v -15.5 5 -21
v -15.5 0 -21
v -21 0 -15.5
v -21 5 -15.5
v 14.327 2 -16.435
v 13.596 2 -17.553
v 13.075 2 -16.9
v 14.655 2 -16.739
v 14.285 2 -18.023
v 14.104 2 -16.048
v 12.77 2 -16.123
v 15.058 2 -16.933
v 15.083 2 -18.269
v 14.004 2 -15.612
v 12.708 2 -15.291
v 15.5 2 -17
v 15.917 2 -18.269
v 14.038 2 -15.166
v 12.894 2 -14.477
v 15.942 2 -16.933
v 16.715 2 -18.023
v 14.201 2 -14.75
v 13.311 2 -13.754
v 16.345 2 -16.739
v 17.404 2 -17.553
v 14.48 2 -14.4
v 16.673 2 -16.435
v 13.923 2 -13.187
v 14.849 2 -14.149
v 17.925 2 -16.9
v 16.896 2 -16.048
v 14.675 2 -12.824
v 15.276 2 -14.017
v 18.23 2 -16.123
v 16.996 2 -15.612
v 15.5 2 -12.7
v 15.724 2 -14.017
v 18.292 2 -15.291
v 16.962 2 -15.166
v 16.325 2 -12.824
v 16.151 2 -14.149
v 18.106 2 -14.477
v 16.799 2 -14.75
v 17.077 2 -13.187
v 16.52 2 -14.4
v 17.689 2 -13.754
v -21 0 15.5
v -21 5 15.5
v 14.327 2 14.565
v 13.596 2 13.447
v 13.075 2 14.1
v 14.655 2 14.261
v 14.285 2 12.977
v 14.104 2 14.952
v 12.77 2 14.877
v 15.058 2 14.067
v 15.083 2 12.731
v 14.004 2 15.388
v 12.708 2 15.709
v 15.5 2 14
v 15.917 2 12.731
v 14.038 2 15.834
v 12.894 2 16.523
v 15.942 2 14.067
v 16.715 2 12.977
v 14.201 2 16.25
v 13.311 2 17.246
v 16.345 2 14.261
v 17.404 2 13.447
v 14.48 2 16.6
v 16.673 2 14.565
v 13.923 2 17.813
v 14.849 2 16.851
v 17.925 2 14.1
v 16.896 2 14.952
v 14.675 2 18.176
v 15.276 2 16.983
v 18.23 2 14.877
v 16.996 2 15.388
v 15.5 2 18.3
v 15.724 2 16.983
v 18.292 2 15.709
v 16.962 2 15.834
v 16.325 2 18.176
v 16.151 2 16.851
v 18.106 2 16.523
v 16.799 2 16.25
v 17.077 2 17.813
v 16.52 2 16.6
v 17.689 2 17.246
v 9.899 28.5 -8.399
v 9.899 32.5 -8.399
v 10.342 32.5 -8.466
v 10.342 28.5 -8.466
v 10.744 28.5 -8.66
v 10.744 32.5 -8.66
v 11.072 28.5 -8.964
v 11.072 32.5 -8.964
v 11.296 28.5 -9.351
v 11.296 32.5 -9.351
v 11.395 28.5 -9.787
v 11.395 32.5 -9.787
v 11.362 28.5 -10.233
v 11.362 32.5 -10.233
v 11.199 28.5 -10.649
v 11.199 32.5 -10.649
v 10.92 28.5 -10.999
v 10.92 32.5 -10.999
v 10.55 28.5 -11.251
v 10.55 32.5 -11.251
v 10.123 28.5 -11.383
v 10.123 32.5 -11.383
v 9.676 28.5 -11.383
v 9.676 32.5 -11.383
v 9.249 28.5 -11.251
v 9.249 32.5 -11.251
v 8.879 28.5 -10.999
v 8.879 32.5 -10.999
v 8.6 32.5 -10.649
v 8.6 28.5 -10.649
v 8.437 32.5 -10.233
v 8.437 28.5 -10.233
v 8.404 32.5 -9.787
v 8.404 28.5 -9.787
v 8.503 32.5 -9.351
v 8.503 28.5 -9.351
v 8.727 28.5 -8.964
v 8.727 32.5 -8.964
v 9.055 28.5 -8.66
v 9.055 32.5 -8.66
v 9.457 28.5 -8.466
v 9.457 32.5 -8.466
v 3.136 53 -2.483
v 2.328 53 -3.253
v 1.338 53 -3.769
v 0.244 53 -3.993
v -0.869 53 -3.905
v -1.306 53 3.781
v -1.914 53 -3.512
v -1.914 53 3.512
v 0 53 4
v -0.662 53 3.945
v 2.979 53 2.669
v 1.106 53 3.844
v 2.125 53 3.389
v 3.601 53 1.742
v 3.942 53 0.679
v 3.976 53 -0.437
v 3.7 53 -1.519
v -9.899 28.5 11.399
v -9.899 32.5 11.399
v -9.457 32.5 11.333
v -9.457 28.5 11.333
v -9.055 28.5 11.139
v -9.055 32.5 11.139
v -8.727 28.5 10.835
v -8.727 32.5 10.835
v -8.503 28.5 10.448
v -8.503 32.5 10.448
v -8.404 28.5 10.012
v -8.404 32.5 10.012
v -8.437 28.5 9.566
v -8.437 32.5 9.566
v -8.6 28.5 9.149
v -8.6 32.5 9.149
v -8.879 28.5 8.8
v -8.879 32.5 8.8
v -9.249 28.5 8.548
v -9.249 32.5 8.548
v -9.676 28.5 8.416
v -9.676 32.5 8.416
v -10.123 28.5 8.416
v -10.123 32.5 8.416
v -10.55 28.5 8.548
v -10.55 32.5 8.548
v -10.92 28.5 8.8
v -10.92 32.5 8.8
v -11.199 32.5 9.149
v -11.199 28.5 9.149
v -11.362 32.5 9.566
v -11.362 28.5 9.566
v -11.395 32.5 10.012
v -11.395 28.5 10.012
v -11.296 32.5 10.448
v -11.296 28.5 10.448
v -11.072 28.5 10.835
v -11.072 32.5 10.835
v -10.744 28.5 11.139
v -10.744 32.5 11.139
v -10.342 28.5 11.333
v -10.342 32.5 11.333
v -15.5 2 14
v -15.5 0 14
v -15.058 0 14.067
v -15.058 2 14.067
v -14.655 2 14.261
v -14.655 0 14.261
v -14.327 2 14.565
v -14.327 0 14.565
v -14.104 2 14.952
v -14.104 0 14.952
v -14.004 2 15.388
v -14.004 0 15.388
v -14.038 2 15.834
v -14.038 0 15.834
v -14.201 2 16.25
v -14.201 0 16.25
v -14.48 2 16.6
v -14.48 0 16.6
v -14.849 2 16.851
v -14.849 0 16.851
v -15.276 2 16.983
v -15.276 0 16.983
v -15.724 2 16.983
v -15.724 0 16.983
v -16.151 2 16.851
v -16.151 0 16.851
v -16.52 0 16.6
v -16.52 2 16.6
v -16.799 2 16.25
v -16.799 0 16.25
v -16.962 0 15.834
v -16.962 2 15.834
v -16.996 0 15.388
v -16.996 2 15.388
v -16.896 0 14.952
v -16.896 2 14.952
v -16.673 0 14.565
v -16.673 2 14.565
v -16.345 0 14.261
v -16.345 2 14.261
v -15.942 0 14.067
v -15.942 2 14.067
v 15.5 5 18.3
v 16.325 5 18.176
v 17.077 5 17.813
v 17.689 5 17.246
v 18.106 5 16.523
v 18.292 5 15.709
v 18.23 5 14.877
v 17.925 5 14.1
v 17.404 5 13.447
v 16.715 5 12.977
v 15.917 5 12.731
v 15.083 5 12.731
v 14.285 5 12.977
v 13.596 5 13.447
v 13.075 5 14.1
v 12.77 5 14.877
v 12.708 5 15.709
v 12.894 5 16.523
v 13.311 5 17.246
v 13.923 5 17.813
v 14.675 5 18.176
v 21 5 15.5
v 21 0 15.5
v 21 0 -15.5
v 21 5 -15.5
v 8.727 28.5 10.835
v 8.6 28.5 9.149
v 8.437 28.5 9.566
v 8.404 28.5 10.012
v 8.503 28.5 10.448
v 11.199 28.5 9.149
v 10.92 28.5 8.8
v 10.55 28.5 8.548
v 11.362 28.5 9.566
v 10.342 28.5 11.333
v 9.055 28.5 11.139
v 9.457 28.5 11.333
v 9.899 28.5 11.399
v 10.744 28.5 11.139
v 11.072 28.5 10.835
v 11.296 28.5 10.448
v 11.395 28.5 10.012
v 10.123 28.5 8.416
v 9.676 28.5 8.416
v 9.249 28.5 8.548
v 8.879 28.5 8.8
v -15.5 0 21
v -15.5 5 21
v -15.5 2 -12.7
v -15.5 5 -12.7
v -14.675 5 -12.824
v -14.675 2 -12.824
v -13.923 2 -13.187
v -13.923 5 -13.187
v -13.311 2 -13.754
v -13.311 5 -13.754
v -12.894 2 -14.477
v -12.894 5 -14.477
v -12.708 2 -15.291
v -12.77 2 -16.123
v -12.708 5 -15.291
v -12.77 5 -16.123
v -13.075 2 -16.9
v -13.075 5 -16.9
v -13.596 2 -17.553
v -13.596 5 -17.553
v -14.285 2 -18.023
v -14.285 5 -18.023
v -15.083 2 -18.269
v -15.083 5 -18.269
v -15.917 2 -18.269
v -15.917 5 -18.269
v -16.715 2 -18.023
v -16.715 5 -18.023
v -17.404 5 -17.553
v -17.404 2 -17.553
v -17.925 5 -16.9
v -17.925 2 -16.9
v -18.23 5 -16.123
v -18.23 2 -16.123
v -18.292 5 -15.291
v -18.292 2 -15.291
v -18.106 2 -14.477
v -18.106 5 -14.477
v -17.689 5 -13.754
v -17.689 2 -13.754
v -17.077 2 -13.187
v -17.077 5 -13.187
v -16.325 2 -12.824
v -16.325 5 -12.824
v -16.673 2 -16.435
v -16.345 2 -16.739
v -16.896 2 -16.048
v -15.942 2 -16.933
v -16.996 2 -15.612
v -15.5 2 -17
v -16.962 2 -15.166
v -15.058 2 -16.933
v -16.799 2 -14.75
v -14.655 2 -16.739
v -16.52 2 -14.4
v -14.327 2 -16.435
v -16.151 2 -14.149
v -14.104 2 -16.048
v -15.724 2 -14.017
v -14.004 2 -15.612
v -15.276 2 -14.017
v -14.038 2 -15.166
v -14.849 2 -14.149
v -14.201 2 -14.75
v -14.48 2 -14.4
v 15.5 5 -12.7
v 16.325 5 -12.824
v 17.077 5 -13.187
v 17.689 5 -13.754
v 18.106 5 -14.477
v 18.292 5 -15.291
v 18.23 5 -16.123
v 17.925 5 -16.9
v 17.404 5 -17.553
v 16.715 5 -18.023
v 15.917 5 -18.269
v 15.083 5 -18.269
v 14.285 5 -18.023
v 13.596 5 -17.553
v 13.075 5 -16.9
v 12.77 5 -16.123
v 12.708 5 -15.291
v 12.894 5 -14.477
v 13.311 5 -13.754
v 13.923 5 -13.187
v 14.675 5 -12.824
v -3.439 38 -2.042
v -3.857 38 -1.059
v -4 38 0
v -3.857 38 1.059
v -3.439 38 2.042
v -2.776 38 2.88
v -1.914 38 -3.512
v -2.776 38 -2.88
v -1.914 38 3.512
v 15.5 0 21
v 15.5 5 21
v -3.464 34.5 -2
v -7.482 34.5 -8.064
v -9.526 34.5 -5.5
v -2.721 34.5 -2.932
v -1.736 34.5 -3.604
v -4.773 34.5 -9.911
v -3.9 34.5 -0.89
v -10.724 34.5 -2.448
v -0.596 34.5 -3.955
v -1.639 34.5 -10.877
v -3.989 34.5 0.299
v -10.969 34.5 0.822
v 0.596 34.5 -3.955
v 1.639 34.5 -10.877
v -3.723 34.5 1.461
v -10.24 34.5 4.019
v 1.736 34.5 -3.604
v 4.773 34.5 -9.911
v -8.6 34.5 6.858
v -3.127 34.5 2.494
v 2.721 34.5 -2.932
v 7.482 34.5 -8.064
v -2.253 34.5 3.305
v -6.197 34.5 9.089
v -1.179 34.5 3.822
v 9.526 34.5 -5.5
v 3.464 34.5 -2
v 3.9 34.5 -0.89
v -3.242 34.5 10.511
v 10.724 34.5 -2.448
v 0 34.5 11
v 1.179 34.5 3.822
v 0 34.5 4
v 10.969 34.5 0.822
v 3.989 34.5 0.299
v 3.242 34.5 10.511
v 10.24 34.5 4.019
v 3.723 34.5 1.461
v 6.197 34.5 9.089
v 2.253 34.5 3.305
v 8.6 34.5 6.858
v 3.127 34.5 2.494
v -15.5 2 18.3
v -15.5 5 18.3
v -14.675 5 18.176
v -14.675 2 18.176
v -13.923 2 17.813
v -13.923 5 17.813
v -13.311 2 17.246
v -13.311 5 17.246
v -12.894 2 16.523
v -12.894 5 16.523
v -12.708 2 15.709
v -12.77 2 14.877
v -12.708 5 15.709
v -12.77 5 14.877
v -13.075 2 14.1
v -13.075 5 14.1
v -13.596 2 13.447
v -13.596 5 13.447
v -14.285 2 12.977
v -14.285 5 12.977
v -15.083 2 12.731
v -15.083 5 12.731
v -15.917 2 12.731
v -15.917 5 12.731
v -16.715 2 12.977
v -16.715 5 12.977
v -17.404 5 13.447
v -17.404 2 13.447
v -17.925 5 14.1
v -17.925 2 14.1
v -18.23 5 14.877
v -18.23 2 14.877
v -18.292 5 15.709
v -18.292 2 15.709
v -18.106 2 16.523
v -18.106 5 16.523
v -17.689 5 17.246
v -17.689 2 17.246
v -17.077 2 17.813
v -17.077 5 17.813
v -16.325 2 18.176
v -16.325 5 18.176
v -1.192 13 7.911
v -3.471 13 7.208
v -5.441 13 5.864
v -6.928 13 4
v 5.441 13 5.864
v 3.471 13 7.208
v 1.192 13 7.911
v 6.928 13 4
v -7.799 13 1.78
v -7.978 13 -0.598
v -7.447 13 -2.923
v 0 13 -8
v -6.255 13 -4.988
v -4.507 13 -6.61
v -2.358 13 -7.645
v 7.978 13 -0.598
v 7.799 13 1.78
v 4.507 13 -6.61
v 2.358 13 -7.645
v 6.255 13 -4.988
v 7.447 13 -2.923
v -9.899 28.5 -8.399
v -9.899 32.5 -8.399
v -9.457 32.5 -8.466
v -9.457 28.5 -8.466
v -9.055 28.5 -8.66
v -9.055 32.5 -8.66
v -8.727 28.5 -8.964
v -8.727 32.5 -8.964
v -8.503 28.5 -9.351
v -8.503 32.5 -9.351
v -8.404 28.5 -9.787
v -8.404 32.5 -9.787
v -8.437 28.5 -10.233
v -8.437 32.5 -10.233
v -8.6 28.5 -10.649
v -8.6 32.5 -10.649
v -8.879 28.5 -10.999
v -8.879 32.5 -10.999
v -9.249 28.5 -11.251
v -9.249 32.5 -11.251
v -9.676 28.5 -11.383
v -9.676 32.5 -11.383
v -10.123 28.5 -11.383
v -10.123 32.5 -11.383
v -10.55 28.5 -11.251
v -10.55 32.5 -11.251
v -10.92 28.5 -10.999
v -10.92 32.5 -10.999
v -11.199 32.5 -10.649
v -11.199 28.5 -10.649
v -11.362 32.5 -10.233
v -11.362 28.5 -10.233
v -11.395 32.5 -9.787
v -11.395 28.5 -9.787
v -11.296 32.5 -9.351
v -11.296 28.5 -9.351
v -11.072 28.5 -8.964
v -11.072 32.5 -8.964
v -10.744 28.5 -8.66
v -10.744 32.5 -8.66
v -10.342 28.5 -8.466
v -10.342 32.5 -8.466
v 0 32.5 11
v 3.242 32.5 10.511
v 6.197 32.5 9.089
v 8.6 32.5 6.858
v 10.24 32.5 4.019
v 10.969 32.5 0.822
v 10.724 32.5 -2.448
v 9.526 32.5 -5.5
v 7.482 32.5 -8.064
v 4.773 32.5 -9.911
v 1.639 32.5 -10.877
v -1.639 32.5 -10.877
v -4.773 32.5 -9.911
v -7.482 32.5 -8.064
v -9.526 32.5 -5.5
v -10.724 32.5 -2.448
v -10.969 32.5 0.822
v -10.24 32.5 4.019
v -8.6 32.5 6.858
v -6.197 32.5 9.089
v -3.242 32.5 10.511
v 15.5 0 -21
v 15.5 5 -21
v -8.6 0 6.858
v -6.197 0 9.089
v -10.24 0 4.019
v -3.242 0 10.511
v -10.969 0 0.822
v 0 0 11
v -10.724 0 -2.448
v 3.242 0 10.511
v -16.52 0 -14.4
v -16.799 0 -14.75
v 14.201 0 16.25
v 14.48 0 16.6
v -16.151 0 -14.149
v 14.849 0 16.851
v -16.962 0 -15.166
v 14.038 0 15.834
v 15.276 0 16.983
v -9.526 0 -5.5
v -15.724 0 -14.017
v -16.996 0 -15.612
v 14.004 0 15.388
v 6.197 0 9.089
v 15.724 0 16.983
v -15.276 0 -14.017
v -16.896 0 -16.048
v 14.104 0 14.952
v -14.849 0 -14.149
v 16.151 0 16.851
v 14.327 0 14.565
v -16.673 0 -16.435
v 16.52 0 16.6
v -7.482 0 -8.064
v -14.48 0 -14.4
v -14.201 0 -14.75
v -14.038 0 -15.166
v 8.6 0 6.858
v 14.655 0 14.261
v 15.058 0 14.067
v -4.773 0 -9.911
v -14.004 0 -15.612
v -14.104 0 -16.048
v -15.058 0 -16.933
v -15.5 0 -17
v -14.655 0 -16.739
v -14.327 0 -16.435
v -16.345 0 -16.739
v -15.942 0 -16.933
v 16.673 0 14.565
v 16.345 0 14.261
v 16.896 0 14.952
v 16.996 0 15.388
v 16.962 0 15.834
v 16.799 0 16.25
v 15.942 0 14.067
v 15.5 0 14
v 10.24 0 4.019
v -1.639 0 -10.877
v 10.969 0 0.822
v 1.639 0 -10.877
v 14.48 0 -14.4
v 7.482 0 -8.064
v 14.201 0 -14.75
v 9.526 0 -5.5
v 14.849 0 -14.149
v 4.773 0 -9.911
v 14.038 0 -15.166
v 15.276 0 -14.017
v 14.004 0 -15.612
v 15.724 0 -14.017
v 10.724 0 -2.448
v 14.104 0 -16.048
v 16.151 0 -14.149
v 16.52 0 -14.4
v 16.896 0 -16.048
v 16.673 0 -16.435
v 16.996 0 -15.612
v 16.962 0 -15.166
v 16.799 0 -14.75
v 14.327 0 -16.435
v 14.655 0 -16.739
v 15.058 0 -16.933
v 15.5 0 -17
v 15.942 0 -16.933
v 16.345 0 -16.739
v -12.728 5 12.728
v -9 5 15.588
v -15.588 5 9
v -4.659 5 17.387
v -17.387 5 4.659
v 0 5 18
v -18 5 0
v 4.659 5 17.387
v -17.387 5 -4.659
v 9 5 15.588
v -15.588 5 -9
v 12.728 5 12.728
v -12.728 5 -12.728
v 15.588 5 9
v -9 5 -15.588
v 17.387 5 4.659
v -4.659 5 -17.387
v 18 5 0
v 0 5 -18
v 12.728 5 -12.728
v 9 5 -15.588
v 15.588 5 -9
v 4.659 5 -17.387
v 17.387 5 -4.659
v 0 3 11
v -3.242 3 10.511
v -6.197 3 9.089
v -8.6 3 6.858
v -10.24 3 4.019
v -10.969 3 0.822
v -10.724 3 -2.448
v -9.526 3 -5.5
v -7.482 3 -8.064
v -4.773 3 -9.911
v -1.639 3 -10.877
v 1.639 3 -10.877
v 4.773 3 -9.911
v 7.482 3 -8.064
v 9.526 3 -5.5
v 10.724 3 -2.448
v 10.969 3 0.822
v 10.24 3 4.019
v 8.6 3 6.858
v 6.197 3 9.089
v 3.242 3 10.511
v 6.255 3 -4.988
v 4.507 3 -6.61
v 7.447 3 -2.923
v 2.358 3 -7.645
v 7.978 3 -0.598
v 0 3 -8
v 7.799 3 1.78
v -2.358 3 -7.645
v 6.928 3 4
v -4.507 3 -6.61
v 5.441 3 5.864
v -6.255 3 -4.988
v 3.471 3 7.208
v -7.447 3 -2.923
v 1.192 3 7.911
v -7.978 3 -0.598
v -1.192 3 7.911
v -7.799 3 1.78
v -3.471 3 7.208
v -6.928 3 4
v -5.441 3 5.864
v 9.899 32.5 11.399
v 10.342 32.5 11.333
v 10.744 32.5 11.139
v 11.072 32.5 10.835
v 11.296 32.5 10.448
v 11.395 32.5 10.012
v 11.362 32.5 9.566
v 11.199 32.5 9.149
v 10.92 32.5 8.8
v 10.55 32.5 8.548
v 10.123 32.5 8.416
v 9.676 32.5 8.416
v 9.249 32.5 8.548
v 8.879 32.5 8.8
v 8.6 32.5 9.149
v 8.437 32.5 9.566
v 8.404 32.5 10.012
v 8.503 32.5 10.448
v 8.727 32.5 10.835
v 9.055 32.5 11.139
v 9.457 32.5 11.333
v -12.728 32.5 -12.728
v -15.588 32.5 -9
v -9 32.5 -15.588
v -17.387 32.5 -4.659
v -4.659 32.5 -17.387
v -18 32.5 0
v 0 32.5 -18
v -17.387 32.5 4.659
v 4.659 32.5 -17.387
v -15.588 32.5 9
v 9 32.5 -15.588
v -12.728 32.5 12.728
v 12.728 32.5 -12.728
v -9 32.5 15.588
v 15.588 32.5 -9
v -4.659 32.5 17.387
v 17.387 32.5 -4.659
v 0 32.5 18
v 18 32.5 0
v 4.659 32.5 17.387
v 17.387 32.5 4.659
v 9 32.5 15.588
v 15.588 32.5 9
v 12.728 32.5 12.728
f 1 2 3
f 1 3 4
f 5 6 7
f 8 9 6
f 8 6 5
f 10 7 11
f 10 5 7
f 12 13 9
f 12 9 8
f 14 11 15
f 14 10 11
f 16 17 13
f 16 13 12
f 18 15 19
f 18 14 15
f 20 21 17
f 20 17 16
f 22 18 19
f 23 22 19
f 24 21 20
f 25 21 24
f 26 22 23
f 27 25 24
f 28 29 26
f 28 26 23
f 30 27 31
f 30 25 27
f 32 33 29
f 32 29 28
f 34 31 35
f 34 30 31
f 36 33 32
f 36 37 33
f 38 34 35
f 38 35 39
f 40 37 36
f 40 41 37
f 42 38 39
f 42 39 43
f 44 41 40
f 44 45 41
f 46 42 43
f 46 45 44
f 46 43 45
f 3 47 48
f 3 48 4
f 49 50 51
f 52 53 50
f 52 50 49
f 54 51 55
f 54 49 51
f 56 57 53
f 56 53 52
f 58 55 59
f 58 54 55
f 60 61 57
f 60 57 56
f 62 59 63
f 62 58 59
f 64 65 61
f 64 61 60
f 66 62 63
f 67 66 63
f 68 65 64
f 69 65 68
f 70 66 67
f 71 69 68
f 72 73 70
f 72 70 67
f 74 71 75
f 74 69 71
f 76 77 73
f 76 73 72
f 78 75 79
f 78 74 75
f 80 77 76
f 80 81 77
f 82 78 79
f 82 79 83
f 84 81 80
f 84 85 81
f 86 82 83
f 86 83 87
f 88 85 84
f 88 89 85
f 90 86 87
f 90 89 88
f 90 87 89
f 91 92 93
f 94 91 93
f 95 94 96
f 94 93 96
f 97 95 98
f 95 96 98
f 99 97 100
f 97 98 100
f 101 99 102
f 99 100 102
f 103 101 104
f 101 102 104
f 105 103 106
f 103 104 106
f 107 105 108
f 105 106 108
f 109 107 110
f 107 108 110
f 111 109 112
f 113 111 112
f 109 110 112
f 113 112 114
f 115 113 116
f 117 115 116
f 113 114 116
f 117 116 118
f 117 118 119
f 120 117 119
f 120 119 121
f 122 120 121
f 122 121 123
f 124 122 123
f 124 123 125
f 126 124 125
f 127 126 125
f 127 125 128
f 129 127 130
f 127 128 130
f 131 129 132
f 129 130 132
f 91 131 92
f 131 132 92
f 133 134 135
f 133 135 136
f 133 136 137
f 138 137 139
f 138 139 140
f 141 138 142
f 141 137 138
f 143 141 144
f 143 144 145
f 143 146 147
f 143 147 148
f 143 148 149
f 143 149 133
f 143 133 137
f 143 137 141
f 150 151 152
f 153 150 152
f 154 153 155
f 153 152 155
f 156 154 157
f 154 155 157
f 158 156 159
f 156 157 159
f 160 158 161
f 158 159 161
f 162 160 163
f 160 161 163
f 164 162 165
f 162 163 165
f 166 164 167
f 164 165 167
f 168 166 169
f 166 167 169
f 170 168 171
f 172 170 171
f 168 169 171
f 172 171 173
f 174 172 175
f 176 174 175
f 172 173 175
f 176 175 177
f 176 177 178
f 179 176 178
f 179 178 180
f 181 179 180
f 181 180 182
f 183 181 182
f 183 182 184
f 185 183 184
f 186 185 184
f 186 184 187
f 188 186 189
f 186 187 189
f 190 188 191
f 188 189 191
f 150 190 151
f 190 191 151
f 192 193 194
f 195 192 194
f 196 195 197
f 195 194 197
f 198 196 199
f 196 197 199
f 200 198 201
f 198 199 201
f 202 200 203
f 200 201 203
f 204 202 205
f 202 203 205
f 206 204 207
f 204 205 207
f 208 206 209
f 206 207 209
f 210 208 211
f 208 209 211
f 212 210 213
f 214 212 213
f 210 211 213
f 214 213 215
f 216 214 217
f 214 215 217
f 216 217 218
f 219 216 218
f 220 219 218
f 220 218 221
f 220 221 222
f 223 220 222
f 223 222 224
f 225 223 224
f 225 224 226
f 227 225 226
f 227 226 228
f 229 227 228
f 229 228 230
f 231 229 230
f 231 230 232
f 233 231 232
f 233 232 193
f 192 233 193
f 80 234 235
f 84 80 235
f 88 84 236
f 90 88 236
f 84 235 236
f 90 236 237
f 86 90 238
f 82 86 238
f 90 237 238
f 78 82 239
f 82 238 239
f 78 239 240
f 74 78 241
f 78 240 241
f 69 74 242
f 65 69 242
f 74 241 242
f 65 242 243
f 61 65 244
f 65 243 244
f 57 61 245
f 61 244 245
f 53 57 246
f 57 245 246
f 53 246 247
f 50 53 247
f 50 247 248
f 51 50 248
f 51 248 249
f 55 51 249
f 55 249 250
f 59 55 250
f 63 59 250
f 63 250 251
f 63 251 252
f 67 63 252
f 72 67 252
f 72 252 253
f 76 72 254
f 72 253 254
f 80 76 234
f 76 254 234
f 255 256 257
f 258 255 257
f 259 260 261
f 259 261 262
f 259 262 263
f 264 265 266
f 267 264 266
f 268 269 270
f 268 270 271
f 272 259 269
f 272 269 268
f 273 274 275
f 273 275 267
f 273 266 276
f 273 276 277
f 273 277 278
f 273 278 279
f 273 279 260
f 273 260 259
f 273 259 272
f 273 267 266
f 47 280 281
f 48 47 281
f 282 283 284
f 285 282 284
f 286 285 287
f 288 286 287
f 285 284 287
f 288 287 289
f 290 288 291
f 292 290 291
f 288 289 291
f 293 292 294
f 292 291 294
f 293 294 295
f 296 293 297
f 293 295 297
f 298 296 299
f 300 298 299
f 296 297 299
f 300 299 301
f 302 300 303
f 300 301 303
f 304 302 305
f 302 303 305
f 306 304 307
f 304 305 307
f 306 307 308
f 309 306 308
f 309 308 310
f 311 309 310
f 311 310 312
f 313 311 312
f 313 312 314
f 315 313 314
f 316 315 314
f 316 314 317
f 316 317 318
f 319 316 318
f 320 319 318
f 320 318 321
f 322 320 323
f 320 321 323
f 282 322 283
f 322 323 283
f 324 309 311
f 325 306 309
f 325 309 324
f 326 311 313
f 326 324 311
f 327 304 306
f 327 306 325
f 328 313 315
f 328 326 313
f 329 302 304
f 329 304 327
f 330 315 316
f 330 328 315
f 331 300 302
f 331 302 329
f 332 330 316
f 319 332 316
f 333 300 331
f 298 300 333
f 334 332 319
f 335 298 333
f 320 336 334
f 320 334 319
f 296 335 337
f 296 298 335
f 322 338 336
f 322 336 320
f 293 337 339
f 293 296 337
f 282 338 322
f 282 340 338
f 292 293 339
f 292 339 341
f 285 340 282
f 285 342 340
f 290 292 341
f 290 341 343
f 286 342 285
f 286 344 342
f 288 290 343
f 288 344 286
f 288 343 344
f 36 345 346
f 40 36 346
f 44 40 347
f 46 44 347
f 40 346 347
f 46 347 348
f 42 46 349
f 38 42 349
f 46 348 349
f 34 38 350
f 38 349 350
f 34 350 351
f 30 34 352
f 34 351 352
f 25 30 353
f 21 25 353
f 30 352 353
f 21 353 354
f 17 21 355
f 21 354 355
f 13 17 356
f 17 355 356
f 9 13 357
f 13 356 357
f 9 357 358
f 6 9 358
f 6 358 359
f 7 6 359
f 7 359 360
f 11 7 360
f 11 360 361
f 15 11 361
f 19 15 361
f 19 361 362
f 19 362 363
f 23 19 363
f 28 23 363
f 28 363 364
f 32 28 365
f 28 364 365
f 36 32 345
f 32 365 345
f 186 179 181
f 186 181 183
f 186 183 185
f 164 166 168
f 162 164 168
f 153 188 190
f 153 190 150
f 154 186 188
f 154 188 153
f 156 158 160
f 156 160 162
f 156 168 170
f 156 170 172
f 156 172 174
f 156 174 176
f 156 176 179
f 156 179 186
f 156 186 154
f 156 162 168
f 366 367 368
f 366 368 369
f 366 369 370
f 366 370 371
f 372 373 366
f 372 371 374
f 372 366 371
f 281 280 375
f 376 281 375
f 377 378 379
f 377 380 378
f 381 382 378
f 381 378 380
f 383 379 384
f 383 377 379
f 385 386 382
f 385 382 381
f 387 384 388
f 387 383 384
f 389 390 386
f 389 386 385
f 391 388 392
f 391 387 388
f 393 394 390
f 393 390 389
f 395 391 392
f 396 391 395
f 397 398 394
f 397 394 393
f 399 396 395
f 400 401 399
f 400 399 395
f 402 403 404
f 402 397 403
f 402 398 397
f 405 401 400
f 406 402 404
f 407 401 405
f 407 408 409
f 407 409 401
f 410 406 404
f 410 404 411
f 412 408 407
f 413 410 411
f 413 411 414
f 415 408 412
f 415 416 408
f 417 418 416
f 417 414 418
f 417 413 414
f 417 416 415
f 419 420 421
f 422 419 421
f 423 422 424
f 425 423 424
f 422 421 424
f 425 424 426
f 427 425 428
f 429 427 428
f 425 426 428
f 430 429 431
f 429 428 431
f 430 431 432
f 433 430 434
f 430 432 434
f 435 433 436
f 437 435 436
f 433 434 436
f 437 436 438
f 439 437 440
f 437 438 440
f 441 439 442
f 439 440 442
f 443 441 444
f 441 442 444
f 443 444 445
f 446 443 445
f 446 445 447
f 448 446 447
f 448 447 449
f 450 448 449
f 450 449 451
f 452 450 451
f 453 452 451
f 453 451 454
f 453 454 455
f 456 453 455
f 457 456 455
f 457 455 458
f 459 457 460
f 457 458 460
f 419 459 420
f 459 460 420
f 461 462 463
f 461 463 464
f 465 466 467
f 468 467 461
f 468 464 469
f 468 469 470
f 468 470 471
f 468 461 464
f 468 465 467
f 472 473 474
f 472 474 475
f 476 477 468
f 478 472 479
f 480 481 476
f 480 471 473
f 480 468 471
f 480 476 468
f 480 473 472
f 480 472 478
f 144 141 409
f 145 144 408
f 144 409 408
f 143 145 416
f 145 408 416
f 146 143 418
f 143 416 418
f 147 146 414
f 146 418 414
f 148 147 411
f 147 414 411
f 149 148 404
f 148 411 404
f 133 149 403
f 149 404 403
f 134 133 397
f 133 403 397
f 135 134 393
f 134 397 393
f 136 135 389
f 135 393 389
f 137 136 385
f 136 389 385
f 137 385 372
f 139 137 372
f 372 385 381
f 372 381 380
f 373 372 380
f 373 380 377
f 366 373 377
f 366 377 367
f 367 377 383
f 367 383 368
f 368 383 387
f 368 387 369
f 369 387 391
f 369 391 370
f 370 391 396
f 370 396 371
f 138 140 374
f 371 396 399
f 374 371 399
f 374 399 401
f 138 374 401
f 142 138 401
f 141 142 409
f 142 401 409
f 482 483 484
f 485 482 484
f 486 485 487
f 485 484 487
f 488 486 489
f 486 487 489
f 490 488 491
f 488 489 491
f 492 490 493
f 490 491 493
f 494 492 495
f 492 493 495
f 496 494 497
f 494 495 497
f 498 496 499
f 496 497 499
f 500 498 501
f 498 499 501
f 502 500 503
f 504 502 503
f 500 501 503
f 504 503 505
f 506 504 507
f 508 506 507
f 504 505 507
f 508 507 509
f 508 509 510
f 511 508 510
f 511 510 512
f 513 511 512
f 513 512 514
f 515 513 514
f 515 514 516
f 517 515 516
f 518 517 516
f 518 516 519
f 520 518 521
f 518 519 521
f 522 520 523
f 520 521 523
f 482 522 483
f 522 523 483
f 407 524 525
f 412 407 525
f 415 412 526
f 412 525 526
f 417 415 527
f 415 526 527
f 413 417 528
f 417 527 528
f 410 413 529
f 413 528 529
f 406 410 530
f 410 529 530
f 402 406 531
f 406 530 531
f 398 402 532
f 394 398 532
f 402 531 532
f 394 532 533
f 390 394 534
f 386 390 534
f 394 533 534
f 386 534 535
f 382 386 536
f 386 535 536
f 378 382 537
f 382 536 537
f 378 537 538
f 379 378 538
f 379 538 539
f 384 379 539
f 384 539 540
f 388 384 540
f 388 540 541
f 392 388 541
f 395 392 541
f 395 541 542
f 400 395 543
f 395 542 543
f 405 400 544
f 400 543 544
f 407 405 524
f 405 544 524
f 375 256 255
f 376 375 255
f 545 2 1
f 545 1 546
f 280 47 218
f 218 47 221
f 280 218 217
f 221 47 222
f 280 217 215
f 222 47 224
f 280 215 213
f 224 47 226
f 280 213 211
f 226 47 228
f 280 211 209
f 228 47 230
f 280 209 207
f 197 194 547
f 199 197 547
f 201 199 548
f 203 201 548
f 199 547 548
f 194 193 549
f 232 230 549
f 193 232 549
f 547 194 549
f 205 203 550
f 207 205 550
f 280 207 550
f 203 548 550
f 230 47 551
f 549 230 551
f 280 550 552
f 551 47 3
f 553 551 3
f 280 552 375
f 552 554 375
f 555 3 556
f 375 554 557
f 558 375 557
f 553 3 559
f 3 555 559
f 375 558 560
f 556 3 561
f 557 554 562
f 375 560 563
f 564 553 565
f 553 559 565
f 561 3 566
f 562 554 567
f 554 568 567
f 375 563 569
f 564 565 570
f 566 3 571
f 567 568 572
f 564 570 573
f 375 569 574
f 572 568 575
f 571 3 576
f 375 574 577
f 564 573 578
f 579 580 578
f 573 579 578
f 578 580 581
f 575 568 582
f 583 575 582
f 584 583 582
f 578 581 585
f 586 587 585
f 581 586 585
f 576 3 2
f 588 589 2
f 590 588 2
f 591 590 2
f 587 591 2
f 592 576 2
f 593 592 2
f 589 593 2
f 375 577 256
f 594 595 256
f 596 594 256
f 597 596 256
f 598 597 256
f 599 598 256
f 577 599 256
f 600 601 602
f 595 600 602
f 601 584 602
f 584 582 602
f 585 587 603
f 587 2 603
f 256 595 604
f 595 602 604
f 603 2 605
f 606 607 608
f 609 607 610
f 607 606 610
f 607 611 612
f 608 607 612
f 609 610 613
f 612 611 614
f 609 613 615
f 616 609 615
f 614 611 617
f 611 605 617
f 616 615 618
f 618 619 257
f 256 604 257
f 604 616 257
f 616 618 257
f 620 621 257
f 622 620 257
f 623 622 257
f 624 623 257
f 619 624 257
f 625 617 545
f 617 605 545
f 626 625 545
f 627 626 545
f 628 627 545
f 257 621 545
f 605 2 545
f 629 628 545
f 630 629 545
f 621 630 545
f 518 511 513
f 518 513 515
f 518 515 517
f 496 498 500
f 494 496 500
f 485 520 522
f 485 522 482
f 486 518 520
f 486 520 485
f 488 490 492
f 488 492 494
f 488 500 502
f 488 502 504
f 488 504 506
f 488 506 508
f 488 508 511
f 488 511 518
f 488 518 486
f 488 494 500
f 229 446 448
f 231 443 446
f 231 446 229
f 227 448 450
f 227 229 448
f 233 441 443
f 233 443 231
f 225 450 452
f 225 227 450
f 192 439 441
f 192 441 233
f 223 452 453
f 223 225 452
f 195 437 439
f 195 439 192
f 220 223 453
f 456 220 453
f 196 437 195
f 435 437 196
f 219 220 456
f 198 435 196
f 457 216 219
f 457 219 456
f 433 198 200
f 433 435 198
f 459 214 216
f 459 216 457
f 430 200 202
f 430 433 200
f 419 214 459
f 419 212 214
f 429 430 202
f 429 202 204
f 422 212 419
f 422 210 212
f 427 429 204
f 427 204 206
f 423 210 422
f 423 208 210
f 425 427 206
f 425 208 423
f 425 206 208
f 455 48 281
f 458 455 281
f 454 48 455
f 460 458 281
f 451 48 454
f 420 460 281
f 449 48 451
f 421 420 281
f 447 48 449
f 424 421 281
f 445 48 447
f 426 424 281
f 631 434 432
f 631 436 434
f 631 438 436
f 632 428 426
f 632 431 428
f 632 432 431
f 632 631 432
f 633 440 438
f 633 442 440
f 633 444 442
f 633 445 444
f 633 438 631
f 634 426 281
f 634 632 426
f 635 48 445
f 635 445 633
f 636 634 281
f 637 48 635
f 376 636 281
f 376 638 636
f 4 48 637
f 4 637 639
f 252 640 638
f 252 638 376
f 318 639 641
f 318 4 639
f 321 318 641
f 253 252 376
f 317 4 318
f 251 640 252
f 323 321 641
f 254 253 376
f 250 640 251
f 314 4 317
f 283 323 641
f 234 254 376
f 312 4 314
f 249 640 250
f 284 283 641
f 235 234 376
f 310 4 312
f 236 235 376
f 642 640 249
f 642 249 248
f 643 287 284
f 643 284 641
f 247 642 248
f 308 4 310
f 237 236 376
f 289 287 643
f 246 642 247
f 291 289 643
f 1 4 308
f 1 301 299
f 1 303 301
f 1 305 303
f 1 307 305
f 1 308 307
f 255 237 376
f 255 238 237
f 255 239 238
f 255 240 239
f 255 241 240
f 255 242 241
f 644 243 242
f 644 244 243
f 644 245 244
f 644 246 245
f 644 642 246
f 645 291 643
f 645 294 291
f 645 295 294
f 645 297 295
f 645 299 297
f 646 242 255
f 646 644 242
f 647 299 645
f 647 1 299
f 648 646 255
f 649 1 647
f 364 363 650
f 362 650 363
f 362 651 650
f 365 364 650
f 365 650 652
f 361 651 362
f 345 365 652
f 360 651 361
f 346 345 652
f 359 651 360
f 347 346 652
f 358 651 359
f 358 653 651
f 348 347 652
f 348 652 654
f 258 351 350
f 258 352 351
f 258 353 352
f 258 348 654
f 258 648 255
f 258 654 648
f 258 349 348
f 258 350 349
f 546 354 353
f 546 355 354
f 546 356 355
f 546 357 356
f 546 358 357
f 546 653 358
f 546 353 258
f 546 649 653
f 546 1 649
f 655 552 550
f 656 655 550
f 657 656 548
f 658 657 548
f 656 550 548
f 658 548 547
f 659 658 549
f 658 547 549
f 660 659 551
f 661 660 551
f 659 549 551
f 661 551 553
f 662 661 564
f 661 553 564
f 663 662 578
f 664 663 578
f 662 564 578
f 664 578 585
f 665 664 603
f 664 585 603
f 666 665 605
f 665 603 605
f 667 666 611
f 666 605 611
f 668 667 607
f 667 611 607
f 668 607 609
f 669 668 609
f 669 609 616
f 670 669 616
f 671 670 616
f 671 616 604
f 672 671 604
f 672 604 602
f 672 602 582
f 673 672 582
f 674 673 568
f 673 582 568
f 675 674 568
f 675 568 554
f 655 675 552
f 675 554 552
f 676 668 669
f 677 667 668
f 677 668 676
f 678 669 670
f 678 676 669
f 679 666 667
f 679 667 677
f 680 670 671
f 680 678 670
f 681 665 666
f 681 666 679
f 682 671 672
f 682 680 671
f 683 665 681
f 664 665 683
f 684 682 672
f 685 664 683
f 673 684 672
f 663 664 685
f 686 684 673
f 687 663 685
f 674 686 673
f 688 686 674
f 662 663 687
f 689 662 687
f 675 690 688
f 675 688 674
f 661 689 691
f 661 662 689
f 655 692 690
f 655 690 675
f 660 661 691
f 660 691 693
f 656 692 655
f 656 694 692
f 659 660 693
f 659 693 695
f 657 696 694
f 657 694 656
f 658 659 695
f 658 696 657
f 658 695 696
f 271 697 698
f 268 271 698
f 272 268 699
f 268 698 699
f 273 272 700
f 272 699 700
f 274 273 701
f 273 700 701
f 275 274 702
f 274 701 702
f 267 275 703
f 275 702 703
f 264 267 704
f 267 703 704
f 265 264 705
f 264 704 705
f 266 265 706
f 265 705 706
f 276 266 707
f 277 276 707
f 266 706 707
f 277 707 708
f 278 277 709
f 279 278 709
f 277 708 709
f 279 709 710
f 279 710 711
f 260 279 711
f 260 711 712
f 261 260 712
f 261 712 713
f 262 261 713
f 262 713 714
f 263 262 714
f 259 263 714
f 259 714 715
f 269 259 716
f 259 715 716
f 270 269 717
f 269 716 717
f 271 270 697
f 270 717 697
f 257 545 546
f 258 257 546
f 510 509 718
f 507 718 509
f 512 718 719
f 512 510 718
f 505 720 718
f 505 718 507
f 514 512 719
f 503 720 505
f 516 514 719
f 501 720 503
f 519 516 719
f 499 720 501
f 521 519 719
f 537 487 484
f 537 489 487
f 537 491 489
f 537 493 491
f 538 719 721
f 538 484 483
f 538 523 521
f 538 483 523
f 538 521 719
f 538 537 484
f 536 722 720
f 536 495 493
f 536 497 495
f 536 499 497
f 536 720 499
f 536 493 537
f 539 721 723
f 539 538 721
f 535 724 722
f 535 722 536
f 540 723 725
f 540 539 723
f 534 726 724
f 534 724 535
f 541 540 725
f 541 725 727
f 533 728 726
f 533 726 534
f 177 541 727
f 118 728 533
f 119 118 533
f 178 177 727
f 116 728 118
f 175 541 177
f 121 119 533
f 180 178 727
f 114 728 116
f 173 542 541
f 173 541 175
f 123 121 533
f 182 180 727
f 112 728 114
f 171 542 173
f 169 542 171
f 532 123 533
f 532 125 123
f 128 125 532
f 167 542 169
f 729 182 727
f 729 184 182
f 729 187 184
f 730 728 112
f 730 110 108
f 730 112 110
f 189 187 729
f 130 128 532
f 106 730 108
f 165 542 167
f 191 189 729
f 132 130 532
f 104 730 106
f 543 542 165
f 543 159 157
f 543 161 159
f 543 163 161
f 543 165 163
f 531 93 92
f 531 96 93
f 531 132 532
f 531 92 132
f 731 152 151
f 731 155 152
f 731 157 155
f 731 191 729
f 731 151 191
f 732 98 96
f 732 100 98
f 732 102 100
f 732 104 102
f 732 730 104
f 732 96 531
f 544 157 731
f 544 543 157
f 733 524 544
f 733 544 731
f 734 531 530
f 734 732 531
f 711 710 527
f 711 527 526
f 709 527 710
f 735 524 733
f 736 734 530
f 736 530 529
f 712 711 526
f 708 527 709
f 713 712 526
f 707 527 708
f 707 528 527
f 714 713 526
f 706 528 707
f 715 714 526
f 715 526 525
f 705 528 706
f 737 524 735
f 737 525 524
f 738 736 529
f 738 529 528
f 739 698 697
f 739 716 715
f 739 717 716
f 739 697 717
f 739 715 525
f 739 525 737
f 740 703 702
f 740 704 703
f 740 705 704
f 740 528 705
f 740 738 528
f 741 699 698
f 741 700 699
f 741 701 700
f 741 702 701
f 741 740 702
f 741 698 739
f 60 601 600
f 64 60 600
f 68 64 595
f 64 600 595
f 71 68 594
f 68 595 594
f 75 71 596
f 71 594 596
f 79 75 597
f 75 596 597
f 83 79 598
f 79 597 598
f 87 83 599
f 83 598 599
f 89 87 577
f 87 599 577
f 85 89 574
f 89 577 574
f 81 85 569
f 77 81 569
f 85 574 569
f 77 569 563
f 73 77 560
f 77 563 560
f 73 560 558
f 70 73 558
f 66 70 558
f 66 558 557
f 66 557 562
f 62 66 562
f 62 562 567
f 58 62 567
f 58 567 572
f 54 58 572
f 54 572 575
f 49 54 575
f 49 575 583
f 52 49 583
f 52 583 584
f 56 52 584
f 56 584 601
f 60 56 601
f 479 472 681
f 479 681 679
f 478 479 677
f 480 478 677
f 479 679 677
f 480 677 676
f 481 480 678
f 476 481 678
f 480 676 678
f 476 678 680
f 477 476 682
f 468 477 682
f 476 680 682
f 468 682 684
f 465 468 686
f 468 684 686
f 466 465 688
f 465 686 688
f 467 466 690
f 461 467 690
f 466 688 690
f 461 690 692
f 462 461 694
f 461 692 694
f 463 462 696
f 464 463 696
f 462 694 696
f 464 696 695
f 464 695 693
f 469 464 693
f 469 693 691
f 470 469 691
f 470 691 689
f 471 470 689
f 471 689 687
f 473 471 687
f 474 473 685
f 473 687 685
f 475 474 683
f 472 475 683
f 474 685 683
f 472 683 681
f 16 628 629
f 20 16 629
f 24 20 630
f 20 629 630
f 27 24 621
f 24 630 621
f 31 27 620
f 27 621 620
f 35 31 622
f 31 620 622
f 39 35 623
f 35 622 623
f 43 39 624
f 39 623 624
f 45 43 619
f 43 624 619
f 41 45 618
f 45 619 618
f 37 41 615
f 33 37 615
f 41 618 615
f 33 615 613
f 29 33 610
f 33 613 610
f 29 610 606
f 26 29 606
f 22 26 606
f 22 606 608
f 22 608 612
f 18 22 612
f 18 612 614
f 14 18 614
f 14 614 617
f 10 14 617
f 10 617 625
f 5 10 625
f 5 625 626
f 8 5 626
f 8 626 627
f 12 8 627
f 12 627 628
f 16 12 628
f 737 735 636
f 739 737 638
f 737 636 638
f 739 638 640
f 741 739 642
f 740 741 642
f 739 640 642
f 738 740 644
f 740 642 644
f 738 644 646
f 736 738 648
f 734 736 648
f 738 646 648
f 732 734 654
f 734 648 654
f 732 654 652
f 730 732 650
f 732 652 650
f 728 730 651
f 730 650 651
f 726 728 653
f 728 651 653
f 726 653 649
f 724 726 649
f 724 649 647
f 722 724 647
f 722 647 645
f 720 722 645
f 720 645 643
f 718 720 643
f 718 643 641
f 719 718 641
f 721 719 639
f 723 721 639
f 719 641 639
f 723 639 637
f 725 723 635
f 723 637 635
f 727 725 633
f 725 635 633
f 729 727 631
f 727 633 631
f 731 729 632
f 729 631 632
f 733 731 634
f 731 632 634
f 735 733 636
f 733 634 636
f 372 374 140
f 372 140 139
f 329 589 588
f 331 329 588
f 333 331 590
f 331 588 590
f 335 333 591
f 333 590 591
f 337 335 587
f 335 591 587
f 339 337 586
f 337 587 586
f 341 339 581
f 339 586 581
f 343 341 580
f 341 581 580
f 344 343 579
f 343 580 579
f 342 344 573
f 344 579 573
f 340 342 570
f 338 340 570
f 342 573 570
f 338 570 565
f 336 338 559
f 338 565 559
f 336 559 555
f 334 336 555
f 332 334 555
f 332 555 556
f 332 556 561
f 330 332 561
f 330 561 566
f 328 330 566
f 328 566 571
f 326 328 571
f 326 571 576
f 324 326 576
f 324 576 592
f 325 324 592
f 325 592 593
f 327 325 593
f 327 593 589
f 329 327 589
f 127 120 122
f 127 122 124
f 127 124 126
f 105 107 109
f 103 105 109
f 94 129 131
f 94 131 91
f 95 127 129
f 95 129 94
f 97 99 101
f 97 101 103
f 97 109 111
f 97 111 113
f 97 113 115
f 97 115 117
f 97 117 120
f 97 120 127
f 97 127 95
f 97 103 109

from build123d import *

# Parameters (mm, degrees)
SKETCH_1_W          = 42
SKETCH_1_H          = 42
EXTRUDE_1_DEPTH     = 5
CHAMFER_1_SIZE      = 5.5
SKETCH_2_R          = 1.5
CUT_EXTRUDE_1_DEPTH = 5
SKETCH_3_R          = 18
EXTRUDE_2_DEPTH     = 27.5
SKETCH_4_R          = 1.5
CUT_EXTRUDE_2_DEPTH = 4
SKETCH_6_R          = 11
EXTRUDE_3_DEPTH     = 2
SKETCH_7_R          = 4
EXTRUDE_4_DEPTH     = 18.5
SKETCH_8_R          = 11
CUT_EXTRUDE_3_DEPTH = 3
SKETCH_9_R          = 8
CUT_EXTRUDE_4_DEPTH = 10
CUT_EXTRUDE_START   = -15
CUT_EXTRUDE_5_DEPTH = 15
SKETCH_12_R         = 2.8
CUT_EXTRUDE_6_DEPTH = 3


with BuildPart() as part:
    # 草图1 → 凸台-拉伸1 (new body)
    with BuildSketch(Plane(origin=(0, 0, 0), x_dir=(1, 0, 0), z_dir=(0, 1, 0))):
        Rectangle(SKETCH_1_W, SKETCH_1_H)
    extrude(amount=EXTRUDE_1_DEPTH)

    # 倒角1
    chamfer_1_edges = [part.edges().sort_by_distance(p)[0] for p in [
        (21, 2.5, 21),
        (-21, 2.5, 21),
        (-21, 2.5, -21),
        (21, 2.5, -21),
    ]]
    chamfer(chamfer_1_edges, length=CHAMFER_1_SIZE)

    # 草图2 → 切除-拉伸1 (cut)
    with BuildSketch(Plane.XZ):
        with Locations(Location((-15.5, 15.5, 0), (0, 0, 270))):
            Circle(SKETCH_2_R)
        with Locations(Location((15.5, 15.5, 0), (0, 0, 270))):
            Circle(SKETCH_2_R)
        with Locations(Location((15.5, -15.5, 0), (0, 0, 270))):
            Circle(SKETCH_2_R)
        with Locations(Location((-15.5, -15.5, 0), (0, 0, 270))):
            Circle(SKETCH_2_R)
    extrude(amount=-CUT_EXTRUDE_1_DEPTH, mode=Mode.SUBTRACT)

    # 草图3 → 凸台-拉伸2 (add)
    with BuildSketch(Plane(origin=(0, 5, 0), x_dir=(1, 0, 0), z_dir=(0, 1, 0))):
        with Locations(Location((0, 0, 0), (0, 0, 270))):
            Circle(SKETCH_3_R)
    extrude(amount=EXTRUDE_2_DEPTH)

    # 草图4 → 切除-拉伸2 (cut)
    with BuildSketch(Plane(origin=(0, 32.5, 0), x_dir=(1, 0, 0), z_dir=(0, 1, 0))):
        with Locations(Location((-9.899494937, 9.899494937, 0), (0, 0, 270))):
            Circle(SKETCH_4_R)
        with Locations(Location((9.899494937, 9.899494937, 0), (0, 0, 270))):
            Circle(SKETCH_4_R)
        with Locations(Location((9.899494937, -9.899494937, 0), (0, 0, 270))):
            Circle(SKETCH_4_R)
        with Locations(Location((-9.899494937, -9.899494937, 0), (0, 0, 270))):
            Circle(SKETCH_4_R)
    extrude(amount=-CUT_EXTRUDE_2_DEPTH, mode=Mode.SUBTRACT)

    # 草图6 → 凸台-拉伸3 (add)
    with BuildSketch(Plane(origin=(0, 32.5, 0), x_dir=(1, 0, 0), z_dir=(0, 1, 0))):
        with Locations(Location((0, 0, 0), (0, 0, 270))):
            Circle(SKETCH_6_R)
    extrude(amount=EXTRUDE_3_DEPTH)

    # 草图7 → 凸台-拉伸4 (add)
    with BuildSketch(Plane(origin=(0, 34.5, 0), x_dir=(1, 0, 0), z_dir=(0, 1, 0))):
        with Locations(Location((0, 0, 0), (0, 0, 270))):
            Circle(SKETCH_7_R)
    extrude(amount=EXTRUDE_4_DEPTH)

    # 草图8 → 切除-拉伸3 (cut)
    with BuildSketch(Plane.XZ):
        with Locations(Location((0, 0, 0), (0, 0, 90))):
            Circle(SKETCH_8_R)
    extrude(amount=-CUT_EXTRUDE_3_DEPTH, mode=Mode.SUBTRACT)

    # 草图9 → 切除-拉伸4 (cut)
    with BuildSketch(Plane.XZ.offset(-3)):
        with Locations(Location((0, 0, 0), (0, 0, 270))):
            Circle(SKETCH_9_R)
    extrude(amount=-CUT_EXTRUDE_4_DEPTH, mode=Mode.SUBTRACT)

    # 草图11 → 切除-拉伸5 (cut)
    with BuildSketch(Plane(origin=(0, 53, 0), x_dir=(1, 0, 0), z_dir=(0, 1, 0)).offset(CUT_EXTRUDE_START)):
        with BuildLine():
            Line((-1.914185744, -3.512248986), (-1.914185744, 3.512248986))
            ThreePointArc((-1.914185744, 3.512248986), (-4, 0), (-1.914185744, -3.512248986))
        make_face()
    extrude(amount=CUT_EXTRUDE_5_DEPTH, mode=Mode.SUBTRACT)

    # 草图12 → 切除-拉伸6 (cut)
    with BuildSketch(Plane(origin=(0, 5, 0), x_dir=(1, 0, 0), z_dir=(0, 1, 0))):
        with Locations(Location((-15.5, 15.5, 0), (0, 0, 270))):
            Circle(SKETCH_12_R)
        with Locations(Location((15.5, 15.5, 0), (0, 0, 270))):
            Circle(SKETCH_12_R)
        with Locations(Location((-15.5, -15.5, 0), (0, 0, 270))):
            Circle(SKETCH_12_R)
        with Locations(Location((15.5, -15.5, 0), (0, 0, 270))):
            Circle(SKETCH_12_R)
    extrude(amount=-CUT_EXTRUDE_6_DEPTH, mode=Mode.SUBTRACT)


solid = part.part
